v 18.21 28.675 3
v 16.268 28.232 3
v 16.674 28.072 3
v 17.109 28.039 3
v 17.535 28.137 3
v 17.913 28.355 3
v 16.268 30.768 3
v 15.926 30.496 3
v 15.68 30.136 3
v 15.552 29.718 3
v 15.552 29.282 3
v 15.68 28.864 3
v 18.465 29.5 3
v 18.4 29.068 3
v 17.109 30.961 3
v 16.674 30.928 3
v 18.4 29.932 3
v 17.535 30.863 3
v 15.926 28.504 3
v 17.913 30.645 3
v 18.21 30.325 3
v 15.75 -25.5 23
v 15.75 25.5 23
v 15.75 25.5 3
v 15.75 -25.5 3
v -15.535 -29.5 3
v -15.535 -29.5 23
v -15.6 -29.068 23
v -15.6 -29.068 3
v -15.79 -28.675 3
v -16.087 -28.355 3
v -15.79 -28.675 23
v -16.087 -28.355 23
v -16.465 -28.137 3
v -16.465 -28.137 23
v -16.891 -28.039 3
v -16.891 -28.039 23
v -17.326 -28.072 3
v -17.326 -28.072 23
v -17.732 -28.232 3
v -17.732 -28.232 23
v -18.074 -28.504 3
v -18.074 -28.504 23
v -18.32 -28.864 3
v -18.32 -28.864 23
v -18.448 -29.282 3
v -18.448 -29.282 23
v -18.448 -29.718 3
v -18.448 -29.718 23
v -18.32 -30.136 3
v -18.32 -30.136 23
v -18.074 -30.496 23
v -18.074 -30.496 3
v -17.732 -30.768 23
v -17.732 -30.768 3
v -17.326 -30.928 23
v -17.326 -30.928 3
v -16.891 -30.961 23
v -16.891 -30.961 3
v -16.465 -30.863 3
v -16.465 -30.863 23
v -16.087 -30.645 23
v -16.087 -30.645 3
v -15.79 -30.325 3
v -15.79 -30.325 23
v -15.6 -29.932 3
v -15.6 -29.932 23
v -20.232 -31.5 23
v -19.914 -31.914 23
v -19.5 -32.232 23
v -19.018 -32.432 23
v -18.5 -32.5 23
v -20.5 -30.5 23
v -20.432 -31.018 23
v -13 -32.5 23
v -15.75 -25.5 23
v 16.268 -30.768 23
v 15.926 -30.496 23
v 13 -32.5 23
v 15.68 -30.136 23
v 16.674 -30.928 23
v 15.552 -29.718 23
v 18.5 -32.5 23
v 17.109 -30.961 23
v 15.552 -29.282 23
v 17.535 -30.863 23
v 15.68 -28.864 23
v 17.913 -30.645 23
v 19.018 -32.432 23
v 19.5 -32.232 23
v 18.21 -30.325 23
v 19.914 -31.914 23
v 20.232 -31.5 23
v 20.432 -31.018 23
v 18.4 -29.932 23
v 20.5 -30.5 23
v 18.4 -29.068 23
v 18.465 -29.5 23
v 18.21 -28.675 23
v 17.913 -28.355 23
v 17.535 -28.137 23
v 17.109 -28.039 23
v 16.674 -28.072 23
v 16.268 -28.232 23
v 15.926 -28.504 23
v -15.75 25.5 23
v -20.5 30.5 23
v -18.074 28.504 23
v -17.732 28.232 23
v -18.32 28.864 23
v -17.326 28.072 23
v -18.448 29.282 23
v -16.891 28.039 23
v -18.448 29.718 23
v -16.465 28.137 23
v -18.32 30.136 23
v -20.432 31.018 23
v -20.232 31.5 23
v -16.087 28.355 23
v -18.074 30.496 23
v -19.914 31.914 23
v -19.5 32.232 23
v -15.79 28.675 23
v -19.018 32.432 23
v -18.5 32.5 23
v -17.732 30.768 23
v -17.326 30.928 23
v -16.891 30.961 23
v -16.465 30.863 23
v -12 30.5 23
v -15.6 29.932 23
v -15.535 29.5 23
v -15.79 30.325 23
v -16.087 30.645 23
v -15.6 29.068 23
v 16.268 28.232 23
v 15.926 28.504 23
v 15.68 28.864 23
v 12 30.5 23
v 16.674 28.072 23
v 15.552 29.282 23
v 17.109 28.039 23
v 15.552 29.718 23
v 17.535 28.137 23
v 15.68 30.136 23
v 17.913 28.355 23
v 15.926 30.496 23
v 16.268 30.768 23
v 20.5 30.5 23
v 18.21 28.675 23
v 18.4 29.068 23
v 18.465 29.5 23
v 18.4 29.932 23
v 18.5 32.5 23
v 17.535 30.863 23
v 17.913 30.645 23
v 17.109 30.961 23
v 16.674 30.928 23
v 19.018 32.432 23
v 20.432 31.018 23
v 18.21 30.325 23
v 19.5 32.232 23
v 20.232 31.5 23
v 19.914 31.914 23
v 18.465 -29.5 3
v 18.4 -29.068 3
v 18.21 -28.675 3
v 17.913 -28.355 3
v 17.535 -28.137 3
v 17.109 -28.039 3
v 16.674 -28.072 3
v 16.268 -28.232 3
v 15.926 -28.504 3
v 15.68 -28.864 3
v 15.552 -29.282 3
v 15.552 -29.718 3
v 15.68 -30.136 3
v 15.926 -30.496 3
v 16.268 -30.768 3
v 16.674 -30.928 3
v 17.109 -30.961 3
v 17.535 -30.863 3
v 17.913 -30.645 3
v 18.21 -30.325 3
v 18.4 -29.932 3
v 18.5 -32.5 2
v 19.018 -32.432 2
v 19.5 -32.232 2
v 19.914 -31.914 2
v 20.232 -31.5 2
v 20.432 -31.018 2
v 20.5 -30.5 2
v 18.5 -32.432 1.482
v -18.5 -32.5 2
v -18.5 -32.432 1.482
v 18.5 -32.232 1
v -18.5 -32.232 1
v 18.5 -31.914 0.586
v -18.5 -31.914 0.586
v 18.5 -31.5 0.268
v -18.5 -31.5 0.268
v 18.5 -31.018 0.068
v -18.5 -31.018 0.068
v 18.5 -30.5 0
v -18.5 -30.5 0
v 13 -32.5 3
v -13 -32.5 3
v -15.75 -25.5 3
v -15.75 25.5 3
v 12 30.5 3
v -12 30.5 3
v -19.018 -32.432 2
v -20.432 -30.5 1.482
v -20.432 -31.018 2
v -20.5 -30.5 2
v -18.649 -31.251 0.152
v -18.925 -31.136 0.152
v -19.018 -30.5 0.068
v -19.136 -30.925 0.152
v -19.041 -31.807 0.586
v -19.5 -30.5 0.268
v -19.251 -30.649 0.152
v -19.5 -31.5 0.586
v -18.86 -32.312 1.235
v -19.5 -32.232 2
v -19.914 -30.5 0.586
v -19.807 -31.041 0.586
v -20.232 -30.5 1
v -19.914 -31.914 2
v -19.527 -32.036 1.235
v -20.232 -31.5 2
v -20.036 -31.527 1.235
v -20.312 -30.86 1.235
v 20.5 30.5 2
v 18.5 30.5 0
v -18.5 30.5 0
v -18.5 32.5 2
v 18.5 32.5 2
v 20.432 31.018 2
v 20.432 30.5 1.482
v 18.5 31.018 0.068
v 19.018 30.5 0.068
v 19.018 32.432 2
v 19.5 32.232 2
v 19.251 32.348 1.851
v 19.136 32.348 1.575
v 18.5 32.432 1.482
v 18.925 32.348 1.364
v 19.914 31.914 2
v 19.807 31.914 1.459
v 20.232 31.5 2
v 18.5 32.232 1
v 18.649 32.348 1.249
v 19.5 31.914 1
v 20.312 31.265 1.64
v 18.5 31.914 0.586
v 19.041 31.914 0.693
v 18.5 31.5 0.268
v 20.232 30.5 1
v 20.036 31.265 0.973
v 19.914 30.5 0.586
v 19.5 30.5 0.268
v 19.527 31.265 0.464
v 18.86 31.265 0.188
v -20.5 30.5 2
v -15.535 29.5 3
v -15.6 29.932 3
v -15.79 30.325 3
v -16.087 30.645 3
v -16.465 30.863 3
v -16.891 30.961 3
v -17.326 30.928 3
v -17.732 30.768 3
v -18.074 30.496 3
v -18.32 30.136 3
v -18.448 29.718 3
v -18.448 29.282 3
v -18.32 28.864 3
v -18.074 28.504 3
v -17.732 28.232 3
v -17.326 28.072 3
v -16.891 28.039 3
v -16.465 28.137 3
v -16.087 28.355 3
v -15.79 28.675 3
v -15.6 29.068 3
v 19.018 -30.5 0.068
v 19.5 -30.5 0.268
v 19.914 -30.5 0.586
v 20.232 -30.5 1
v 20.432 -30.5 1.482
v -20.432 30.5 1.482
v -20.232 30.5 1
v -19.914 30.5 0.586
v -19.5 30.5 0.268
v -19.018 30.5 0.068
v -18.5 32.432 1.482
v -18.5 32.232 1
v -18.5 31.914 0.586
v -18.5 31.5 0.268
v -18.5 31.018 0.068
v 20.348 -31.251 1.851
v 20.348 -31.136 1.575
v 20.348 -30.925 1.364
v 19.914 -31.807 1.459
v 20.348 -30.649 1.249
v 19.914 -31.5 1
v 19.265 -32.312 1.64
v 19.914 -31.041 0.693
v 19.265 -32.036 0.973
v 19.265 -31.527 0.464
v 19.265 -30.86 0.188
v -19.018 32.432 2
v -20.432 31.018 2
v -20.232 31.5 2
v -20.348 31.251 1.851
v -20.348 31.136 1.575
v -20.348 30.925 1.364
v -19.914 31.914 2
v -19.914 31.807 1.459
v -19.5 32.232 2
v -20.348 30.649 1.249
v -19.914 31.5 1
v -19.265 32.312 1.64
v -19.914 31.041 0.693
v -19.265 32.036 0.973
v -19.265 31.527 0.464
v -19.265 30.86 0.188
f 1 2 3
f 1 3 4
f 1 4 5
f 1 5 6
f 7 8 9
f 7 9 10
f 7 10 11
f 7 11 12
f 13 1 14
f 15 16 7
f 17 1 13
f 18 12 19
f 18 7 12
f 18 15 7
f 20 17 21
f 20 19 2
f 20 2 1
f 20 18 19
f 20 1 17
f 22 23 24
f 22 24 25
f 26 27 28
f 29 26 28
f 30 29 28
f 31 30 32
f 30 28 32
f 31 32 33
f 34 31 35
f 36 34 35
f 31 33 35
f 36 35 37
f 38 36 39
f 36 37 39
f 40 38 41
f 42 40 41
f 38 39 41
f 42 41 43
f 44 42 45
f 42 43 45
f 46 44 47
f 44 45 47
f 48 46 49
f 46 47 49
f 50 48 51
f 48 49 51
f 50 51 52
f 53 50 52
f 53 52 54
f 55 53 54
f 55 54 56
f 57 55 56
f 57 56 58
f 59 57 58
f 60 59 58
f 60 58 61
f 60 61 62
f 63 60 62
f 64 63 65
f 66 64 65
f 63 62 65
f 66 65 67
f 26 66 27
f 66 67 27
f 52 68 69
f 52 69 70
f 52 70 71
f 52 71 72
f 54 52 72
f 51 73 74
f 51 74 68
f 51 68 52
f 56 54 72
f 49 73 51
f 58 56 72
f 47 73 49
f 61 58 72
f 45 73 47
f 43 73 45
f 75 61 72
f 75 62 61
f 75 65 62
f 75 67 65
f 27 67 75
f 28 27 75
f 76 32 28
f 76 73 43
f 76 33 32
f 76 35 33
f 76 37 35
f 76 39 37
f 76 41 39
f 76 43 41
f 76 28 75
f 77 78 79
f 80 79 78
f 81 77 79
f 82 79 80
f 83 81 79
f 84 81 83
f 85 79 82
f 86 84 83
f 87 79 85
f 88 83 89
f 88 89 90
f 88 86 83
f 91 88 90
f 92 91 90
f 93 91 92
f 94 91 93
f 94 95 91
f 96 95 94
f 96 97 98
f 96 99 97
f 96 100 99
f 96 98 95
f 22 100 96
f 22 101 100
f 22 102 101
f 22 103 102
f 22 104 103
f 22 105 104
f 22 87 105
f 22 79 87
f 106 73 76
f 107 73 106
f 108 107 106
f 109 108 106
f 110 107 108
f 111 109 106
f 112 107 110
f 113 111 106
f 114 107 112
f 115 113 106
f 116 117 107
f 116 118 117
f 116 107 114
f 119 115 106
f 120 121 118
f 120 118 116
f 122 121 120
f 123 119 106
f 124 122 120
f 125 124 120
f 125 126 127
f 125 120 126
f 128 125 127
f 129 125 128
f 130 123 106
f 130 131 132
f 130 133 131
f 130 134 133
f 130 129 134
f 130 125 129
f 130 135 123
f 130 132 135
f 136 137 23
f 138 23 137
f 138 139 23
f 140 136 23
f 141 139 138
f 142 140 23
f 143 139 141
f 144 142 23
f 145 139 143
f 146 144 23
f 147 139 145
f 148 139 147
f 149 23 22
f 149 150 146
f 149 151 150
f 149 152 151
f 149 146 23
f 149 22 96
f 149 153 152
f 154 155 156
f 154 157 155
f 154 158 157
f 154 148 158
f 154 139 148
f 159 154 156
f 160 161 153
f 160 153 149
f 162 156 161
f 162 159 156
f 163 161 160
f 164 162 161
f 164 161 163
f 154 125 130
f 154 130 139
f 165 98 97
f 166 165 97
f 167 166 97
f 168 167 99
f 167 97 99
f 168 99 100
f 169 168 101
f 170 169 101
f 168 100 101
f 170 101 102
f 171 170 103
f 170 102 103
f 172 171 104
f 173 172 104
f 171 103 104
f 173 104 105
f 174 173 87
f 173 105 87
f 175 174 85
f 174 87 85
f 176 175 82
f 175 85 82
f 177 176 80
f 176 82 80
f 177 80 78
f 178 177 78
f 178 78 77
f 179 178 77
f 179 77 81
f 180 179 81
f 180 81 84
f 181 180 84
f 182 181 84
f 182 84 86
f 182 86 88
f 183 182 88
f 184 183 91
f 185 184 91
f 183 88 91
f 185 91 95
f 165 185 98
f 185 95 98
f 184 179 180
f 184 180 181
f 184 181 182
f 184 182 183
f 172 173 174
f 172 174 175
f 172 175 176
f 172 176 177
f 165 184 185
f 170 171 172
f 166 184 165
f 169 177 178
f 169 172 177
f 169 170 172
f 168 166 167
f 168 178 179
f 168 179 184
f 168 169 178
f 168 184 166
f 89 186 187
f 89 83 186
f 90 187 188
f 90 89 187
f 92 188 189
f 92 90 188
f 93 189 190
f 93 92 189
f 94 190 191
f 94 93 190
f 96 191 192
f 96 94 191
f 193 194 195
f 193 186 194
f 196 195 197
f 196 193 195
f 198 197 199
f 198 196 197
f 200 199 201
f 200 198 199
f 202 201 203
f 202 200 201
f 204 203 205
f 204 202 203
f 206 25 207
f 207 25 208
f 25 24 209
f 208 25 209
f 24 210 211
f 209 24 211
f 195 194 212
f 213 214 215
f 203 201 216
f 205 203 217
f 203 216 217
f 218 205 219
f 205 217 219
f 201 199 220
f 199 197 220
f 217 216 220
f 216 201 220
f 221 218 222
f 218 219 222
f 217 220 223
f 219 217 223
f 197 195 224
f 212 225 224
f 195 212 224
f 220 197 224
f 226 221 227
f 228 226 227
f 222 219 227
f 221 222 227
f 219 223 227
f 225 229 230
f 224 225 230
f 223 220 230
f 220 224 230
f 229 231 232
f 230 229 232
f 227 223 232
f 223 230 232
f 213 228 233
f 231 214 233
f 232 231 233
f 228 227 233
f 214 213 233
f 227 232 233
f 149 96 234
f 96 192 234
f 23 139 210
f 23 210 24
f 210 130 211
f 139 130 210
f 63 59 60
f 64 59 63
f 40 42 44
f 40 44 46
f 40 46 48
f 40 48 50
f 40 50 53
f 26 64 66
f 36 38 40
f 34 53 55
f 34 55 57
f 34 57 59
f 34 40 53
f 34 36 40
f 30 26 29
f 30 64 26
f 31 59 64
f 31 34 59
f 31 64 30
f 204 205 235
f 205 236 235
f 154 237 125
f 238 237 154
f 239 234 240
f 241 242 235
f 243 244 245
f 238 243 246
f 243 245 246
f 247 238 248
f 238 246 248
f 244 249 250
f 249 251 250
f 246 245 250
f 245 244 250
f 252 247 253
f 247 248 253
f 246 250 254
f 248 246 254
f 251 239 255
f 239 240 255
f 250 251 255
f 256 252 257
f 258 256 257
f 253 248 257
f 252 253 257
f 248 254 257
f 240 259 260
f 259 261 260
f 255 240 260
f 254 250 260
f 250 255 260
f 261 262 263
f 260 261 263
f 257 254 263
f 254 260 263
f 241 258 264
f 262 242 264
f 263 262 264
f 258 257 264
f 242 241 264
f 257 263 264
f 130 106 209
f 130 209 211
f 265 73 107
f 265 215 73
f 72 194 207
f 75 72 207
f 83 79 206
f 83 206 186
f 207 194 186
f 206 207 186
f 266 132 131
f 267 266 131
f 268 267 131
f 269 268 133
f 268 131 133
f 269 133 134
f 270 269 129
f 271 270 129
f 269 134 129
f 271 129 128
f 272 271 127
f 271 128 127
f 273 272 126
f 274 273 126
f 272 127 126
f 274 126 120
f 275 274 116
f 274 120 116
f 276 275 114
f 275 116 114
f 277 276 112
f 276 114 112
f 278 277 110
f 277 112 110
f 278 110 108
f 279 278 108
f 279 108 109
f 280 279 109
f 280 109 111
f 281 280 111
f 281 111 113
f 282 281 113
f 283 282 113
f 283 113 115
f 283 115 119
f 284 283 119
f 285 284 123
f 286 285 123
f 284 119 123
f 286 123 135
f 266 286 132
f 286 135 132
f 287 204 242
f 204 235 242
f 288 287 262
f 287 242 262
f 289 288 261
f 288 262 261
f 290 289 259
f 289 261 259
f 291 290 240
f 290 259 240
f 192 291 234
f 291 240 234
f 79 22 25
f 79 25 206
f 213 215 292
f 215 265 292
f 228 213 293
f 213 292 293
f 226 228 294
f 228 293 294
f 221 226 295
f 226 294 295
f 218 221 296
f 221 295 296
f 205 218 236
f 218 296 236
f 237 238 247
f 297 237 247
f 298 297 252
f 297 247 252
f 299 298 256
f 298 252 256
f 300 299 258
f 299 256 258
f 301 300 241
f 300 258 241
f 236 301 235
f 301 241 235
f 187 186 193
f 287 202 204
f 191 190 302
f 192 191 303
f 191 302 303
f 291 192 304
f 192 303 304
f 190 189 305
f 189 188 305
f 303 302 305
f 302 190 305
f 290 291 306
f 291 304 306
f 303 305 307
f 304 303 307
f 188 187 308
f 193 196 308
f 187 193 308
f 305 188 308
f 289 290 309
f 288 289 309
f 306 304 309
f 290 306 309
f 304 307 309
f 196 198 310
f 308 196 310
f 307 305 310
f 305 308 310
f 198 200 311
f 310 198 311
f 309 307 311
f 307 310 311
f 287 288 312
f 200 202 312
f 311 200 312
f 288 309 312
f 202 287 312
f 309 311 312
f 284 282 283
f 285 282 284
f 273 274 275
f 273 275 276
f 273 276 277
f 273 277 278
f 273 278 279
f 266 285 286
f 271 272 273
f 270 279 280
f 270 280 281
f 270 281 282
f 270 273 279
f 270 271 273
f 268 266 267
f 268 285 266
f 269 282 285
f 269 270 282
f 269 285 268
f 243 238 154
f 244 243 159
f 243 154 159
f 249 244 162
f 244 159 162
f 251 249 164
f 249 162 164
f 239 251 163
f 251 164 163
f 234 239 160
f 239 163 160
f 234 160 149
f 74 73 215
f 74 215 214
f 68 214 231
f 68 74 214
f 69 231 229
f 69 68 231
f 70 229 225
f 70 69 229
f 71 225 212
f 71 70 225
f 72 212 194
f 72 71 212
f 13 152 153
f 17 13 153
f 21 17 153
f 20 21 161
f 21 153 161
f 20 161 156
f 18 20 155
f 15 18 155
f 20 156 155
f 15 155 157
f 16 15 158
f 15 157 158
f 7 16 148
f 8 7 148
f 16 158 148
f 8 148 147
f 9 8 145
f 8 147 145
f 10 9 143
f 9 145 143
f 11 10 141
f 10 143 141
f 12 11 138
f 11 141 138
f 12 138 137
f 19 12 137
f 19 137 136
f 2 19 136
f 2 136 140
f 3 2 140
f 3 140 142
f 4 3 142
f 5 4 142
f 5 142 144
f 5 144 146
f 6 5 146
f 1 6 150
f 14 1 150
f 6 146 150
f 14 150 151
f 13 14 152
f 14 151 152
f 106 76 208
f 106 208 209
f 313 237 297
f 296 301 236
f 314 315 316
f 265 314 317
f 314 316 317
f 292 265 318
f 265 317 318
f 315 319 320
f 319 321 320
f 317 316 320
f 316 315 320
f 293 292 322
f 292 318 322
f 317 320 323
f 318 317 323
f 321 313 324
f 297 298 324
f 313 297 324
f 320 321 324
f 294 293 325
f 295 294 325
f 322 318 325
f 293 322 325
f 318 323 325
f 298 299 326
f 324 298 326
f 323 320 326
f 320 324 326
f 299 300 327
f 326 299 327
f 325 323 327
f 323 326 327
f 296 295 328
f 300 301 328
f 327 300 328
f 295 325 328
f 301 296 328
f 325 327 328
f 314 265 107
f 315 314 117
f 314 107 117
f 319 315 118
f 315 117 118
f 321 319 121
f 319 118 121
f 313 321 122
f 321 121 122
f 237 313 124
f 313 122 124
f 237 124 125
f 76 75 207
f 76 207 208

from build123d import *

# Parameters (mm, degrees)
SKETCH_W     = 41
SKETCH_H     = 65
PAD_DEPTH    = 23
SKETCH001_R  = 1.464693
POCKET_DEPTH = 20
FILLET_R     = 2


with BuildPart() as part:
    # Sketch → Pad (new body)
    with BuildSketch(Plane.XY):
        Rectangle(SKETCH_W, SKETCH_H)
    extrude(amount=PAD_DEPTH)

    # Sketch001 → Pocket (cut)
    with BuildSketch(Plane.XY.offset(23)):
        with Locations((17, 29.5)):
            Circle(SKETCH001_R)
        with Locations((-17, 29.5)):
            Circle(SKETCH001_R)
        with Locations((17, -29.5)):
            Circle(SKETCH001_R)
        with Locations((-17, -29.5)):
            Circle(SKETCH001_R)
        Polygon((-12, 30.5), (12, 30.5), (15.75, 25.5), (15.75, -25.5), (13, -32.5), (-13, -32.5), (-15.75, -25.5), (-15.75, 25.5), align=None)
    extrude(amount=-POCKET_DEPTH, mode=Mode.SUBTRACT)

    # Fillet
    fillet_edges = [part.edges().sort_by_distance(p)[0] for p in [
        (-20.5, -32.5, 11.5),
        (0, -32.5, 0),
        (20.5, -32.5, 11.5),
        (20.5, 0, 0),
        (20.5, 32.5, 11.5),
        (0, 32.5, 0),
        (-20.5, 32.5, 11.5),
        (-20.5, 0, 0),
    ]]
    fillet(fillet_edges, radius=FILLET_R)


solid = part.part
